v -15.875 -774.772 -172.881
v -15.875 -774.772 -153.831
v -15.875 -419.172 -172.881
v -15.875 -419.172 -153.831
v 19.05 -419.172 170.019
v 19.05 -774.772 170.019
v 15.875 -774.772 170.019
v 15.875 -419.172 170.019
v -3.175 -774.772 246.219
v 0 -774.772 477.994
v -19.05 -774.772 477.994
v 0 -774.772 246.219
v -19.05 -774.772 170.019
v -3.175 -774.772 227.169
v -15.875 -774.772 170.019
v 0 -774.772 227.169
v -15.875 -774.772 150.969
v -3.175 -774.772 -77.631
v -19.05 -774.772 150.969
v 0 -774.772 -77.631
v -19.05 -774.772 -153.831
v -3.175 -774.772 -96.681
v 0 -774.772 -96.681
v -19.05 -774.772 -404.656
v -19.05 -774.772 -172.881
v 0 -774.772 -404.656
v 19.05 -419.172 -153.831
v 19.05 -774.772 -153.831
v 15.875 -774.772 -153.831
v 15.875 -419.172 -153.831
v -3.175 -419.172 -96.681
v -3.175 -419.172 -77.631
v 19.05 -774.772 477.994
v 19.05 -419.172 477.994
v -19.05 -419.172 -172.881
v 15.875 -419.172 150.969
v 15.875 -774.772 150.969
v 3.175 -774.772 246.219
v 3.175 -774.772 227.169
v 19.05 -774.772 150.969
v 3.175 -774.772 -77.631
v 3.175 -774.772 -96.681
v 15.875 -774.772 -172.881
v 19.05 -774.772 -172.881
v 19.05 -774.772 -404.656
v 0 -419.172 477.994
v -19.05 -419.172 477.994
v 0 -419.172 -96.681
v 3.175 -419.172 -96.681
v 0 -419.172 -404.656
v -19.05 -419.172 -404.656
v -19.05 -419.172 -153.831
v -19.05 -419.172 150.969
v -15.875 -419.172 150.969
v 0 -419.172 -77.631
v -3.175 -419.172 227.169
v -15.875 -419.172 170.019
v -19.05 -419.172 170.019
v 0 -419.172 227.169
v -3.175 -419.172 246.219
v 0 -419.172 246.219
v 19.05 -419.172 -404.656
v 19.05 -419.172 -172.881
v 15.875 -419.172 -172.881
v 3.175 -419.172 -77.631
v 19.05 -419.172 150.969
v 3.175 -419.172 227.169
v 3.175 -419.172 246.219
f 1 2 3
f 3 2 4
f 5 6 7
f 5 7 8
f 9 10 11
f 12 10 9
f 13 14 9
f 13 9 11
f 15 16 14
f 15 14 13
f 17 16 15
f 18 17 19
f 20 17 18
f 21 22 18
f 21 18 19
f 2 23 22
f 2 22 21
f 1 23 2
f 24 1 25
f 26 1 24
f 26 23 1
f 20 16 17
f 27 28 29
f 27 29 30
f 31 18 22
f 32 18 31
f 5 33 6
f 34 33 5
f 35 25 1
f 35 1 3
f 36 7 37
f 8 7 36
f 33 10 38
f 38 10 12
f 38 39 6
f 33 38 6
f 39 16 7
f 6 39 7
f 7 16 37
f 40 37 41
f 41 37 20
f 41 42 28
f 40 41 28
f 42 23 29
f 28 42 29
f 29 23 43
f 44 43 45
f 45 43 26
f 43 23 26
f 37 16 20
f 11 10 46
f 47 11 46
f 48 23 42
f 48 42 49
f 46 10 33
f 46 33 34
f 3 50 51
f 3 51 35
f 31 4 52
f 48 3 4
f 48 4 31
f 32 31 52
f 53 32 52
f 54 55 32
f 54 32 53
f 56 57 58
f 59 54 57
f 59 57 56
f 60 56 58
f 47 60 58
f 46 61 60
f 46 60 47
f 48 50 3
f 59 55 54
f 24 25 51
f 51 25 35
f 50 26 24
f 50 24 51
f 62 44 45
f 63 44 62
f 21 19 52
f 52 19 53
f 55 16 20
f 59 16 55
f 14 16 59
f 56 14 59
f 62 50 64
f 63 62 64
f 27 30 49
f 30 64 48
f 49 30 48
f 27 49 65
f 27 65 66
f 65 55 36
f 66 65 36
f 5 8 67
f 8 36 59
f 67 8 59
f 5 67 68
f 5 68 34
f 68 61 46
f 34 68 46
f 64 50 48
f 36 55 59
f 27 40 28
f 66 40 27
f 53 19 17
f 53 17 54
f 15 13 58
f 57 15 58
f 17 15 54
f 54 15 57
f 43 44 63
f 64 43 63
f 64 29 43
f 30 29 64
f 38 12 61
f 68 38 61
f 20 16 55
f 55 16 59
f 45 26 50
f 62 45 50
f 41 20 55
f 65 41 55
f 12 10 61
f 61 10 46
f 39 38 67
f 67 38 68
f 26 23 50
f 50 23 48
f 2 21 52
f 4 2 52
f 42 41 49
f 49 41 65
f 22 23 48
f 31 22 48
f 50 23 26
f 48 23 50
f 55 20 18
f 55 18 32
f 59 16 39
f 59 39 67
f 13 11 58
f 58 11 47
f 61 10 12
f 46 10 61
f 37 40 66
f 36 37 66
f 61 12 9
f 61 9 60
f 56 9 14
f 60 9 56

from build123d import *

# Parameters (mm, degrees)
F0_W     = 355.6
F0_H     = 19.05
F0_H_2   = 231.775
F0_H_3   = 307.975
F0_H_4   = 304.8
F1_DEPTH = 19.05
F2_DEPTH = 3.175
F3_W     = 355.6
F3_H     = 19.05
F4_DEPTH = 3.175


with BuildPart() as f1:
    # F0 (on Right) → F1 (new body)
    with BuildSketch(Plane.YZ):
        with Locations((-596.972364, 236.693677)):
            Rectangle(F0_W, F0_H)
        with Locations((-596.972364, -87.156323)):
            Rectangle(F0_W, F0_H)
        with Locations((-596.972364, 362.106177)):
            Rectangle(F0_W, F0_H_2)
        with Locations((-596.972364, -250.668823)):
            Rectangle(F0_W, F0_H_3)
        with Locations((-596.972364, 74.768677)):
            Rectangle(F0_W, F0_H_4)
    extrude(amount=F1_DEPTH)

    # F0 (on Right) → F2 (cut)
    with BuildSketch(Plane.YZ):
        with Locations((-596.972364, 236.693677)):
            Rectangle(F0_W, F0_H)
        with Locations((-596.972364, -87.156323)):
            Rectangle(F0_W, F0_H)
    extrude(amount=F2_DEPTH, mode=Mode.SUBTRACT)

    # F3 (on face) → F4 (cut)
    with BuildSketch(Plane.YZ.offset(19.05)):
        with Locations((-596.972364, 160.493677)):
            Rectangle(F3_W, F3_H)
        with Locations((-596.972364, -163.356323)):
            Rectangle(F3_W, F3_H)
    extrude(amount=-F4_DEPTH, mode=Mode.SUBTRACT)


with BuildPart() as f5_1:
    # F5: instance of F1
    add(f1.part.mirror(Plane.YZ))


solid = Compound([f1.part, f5_1.part])
